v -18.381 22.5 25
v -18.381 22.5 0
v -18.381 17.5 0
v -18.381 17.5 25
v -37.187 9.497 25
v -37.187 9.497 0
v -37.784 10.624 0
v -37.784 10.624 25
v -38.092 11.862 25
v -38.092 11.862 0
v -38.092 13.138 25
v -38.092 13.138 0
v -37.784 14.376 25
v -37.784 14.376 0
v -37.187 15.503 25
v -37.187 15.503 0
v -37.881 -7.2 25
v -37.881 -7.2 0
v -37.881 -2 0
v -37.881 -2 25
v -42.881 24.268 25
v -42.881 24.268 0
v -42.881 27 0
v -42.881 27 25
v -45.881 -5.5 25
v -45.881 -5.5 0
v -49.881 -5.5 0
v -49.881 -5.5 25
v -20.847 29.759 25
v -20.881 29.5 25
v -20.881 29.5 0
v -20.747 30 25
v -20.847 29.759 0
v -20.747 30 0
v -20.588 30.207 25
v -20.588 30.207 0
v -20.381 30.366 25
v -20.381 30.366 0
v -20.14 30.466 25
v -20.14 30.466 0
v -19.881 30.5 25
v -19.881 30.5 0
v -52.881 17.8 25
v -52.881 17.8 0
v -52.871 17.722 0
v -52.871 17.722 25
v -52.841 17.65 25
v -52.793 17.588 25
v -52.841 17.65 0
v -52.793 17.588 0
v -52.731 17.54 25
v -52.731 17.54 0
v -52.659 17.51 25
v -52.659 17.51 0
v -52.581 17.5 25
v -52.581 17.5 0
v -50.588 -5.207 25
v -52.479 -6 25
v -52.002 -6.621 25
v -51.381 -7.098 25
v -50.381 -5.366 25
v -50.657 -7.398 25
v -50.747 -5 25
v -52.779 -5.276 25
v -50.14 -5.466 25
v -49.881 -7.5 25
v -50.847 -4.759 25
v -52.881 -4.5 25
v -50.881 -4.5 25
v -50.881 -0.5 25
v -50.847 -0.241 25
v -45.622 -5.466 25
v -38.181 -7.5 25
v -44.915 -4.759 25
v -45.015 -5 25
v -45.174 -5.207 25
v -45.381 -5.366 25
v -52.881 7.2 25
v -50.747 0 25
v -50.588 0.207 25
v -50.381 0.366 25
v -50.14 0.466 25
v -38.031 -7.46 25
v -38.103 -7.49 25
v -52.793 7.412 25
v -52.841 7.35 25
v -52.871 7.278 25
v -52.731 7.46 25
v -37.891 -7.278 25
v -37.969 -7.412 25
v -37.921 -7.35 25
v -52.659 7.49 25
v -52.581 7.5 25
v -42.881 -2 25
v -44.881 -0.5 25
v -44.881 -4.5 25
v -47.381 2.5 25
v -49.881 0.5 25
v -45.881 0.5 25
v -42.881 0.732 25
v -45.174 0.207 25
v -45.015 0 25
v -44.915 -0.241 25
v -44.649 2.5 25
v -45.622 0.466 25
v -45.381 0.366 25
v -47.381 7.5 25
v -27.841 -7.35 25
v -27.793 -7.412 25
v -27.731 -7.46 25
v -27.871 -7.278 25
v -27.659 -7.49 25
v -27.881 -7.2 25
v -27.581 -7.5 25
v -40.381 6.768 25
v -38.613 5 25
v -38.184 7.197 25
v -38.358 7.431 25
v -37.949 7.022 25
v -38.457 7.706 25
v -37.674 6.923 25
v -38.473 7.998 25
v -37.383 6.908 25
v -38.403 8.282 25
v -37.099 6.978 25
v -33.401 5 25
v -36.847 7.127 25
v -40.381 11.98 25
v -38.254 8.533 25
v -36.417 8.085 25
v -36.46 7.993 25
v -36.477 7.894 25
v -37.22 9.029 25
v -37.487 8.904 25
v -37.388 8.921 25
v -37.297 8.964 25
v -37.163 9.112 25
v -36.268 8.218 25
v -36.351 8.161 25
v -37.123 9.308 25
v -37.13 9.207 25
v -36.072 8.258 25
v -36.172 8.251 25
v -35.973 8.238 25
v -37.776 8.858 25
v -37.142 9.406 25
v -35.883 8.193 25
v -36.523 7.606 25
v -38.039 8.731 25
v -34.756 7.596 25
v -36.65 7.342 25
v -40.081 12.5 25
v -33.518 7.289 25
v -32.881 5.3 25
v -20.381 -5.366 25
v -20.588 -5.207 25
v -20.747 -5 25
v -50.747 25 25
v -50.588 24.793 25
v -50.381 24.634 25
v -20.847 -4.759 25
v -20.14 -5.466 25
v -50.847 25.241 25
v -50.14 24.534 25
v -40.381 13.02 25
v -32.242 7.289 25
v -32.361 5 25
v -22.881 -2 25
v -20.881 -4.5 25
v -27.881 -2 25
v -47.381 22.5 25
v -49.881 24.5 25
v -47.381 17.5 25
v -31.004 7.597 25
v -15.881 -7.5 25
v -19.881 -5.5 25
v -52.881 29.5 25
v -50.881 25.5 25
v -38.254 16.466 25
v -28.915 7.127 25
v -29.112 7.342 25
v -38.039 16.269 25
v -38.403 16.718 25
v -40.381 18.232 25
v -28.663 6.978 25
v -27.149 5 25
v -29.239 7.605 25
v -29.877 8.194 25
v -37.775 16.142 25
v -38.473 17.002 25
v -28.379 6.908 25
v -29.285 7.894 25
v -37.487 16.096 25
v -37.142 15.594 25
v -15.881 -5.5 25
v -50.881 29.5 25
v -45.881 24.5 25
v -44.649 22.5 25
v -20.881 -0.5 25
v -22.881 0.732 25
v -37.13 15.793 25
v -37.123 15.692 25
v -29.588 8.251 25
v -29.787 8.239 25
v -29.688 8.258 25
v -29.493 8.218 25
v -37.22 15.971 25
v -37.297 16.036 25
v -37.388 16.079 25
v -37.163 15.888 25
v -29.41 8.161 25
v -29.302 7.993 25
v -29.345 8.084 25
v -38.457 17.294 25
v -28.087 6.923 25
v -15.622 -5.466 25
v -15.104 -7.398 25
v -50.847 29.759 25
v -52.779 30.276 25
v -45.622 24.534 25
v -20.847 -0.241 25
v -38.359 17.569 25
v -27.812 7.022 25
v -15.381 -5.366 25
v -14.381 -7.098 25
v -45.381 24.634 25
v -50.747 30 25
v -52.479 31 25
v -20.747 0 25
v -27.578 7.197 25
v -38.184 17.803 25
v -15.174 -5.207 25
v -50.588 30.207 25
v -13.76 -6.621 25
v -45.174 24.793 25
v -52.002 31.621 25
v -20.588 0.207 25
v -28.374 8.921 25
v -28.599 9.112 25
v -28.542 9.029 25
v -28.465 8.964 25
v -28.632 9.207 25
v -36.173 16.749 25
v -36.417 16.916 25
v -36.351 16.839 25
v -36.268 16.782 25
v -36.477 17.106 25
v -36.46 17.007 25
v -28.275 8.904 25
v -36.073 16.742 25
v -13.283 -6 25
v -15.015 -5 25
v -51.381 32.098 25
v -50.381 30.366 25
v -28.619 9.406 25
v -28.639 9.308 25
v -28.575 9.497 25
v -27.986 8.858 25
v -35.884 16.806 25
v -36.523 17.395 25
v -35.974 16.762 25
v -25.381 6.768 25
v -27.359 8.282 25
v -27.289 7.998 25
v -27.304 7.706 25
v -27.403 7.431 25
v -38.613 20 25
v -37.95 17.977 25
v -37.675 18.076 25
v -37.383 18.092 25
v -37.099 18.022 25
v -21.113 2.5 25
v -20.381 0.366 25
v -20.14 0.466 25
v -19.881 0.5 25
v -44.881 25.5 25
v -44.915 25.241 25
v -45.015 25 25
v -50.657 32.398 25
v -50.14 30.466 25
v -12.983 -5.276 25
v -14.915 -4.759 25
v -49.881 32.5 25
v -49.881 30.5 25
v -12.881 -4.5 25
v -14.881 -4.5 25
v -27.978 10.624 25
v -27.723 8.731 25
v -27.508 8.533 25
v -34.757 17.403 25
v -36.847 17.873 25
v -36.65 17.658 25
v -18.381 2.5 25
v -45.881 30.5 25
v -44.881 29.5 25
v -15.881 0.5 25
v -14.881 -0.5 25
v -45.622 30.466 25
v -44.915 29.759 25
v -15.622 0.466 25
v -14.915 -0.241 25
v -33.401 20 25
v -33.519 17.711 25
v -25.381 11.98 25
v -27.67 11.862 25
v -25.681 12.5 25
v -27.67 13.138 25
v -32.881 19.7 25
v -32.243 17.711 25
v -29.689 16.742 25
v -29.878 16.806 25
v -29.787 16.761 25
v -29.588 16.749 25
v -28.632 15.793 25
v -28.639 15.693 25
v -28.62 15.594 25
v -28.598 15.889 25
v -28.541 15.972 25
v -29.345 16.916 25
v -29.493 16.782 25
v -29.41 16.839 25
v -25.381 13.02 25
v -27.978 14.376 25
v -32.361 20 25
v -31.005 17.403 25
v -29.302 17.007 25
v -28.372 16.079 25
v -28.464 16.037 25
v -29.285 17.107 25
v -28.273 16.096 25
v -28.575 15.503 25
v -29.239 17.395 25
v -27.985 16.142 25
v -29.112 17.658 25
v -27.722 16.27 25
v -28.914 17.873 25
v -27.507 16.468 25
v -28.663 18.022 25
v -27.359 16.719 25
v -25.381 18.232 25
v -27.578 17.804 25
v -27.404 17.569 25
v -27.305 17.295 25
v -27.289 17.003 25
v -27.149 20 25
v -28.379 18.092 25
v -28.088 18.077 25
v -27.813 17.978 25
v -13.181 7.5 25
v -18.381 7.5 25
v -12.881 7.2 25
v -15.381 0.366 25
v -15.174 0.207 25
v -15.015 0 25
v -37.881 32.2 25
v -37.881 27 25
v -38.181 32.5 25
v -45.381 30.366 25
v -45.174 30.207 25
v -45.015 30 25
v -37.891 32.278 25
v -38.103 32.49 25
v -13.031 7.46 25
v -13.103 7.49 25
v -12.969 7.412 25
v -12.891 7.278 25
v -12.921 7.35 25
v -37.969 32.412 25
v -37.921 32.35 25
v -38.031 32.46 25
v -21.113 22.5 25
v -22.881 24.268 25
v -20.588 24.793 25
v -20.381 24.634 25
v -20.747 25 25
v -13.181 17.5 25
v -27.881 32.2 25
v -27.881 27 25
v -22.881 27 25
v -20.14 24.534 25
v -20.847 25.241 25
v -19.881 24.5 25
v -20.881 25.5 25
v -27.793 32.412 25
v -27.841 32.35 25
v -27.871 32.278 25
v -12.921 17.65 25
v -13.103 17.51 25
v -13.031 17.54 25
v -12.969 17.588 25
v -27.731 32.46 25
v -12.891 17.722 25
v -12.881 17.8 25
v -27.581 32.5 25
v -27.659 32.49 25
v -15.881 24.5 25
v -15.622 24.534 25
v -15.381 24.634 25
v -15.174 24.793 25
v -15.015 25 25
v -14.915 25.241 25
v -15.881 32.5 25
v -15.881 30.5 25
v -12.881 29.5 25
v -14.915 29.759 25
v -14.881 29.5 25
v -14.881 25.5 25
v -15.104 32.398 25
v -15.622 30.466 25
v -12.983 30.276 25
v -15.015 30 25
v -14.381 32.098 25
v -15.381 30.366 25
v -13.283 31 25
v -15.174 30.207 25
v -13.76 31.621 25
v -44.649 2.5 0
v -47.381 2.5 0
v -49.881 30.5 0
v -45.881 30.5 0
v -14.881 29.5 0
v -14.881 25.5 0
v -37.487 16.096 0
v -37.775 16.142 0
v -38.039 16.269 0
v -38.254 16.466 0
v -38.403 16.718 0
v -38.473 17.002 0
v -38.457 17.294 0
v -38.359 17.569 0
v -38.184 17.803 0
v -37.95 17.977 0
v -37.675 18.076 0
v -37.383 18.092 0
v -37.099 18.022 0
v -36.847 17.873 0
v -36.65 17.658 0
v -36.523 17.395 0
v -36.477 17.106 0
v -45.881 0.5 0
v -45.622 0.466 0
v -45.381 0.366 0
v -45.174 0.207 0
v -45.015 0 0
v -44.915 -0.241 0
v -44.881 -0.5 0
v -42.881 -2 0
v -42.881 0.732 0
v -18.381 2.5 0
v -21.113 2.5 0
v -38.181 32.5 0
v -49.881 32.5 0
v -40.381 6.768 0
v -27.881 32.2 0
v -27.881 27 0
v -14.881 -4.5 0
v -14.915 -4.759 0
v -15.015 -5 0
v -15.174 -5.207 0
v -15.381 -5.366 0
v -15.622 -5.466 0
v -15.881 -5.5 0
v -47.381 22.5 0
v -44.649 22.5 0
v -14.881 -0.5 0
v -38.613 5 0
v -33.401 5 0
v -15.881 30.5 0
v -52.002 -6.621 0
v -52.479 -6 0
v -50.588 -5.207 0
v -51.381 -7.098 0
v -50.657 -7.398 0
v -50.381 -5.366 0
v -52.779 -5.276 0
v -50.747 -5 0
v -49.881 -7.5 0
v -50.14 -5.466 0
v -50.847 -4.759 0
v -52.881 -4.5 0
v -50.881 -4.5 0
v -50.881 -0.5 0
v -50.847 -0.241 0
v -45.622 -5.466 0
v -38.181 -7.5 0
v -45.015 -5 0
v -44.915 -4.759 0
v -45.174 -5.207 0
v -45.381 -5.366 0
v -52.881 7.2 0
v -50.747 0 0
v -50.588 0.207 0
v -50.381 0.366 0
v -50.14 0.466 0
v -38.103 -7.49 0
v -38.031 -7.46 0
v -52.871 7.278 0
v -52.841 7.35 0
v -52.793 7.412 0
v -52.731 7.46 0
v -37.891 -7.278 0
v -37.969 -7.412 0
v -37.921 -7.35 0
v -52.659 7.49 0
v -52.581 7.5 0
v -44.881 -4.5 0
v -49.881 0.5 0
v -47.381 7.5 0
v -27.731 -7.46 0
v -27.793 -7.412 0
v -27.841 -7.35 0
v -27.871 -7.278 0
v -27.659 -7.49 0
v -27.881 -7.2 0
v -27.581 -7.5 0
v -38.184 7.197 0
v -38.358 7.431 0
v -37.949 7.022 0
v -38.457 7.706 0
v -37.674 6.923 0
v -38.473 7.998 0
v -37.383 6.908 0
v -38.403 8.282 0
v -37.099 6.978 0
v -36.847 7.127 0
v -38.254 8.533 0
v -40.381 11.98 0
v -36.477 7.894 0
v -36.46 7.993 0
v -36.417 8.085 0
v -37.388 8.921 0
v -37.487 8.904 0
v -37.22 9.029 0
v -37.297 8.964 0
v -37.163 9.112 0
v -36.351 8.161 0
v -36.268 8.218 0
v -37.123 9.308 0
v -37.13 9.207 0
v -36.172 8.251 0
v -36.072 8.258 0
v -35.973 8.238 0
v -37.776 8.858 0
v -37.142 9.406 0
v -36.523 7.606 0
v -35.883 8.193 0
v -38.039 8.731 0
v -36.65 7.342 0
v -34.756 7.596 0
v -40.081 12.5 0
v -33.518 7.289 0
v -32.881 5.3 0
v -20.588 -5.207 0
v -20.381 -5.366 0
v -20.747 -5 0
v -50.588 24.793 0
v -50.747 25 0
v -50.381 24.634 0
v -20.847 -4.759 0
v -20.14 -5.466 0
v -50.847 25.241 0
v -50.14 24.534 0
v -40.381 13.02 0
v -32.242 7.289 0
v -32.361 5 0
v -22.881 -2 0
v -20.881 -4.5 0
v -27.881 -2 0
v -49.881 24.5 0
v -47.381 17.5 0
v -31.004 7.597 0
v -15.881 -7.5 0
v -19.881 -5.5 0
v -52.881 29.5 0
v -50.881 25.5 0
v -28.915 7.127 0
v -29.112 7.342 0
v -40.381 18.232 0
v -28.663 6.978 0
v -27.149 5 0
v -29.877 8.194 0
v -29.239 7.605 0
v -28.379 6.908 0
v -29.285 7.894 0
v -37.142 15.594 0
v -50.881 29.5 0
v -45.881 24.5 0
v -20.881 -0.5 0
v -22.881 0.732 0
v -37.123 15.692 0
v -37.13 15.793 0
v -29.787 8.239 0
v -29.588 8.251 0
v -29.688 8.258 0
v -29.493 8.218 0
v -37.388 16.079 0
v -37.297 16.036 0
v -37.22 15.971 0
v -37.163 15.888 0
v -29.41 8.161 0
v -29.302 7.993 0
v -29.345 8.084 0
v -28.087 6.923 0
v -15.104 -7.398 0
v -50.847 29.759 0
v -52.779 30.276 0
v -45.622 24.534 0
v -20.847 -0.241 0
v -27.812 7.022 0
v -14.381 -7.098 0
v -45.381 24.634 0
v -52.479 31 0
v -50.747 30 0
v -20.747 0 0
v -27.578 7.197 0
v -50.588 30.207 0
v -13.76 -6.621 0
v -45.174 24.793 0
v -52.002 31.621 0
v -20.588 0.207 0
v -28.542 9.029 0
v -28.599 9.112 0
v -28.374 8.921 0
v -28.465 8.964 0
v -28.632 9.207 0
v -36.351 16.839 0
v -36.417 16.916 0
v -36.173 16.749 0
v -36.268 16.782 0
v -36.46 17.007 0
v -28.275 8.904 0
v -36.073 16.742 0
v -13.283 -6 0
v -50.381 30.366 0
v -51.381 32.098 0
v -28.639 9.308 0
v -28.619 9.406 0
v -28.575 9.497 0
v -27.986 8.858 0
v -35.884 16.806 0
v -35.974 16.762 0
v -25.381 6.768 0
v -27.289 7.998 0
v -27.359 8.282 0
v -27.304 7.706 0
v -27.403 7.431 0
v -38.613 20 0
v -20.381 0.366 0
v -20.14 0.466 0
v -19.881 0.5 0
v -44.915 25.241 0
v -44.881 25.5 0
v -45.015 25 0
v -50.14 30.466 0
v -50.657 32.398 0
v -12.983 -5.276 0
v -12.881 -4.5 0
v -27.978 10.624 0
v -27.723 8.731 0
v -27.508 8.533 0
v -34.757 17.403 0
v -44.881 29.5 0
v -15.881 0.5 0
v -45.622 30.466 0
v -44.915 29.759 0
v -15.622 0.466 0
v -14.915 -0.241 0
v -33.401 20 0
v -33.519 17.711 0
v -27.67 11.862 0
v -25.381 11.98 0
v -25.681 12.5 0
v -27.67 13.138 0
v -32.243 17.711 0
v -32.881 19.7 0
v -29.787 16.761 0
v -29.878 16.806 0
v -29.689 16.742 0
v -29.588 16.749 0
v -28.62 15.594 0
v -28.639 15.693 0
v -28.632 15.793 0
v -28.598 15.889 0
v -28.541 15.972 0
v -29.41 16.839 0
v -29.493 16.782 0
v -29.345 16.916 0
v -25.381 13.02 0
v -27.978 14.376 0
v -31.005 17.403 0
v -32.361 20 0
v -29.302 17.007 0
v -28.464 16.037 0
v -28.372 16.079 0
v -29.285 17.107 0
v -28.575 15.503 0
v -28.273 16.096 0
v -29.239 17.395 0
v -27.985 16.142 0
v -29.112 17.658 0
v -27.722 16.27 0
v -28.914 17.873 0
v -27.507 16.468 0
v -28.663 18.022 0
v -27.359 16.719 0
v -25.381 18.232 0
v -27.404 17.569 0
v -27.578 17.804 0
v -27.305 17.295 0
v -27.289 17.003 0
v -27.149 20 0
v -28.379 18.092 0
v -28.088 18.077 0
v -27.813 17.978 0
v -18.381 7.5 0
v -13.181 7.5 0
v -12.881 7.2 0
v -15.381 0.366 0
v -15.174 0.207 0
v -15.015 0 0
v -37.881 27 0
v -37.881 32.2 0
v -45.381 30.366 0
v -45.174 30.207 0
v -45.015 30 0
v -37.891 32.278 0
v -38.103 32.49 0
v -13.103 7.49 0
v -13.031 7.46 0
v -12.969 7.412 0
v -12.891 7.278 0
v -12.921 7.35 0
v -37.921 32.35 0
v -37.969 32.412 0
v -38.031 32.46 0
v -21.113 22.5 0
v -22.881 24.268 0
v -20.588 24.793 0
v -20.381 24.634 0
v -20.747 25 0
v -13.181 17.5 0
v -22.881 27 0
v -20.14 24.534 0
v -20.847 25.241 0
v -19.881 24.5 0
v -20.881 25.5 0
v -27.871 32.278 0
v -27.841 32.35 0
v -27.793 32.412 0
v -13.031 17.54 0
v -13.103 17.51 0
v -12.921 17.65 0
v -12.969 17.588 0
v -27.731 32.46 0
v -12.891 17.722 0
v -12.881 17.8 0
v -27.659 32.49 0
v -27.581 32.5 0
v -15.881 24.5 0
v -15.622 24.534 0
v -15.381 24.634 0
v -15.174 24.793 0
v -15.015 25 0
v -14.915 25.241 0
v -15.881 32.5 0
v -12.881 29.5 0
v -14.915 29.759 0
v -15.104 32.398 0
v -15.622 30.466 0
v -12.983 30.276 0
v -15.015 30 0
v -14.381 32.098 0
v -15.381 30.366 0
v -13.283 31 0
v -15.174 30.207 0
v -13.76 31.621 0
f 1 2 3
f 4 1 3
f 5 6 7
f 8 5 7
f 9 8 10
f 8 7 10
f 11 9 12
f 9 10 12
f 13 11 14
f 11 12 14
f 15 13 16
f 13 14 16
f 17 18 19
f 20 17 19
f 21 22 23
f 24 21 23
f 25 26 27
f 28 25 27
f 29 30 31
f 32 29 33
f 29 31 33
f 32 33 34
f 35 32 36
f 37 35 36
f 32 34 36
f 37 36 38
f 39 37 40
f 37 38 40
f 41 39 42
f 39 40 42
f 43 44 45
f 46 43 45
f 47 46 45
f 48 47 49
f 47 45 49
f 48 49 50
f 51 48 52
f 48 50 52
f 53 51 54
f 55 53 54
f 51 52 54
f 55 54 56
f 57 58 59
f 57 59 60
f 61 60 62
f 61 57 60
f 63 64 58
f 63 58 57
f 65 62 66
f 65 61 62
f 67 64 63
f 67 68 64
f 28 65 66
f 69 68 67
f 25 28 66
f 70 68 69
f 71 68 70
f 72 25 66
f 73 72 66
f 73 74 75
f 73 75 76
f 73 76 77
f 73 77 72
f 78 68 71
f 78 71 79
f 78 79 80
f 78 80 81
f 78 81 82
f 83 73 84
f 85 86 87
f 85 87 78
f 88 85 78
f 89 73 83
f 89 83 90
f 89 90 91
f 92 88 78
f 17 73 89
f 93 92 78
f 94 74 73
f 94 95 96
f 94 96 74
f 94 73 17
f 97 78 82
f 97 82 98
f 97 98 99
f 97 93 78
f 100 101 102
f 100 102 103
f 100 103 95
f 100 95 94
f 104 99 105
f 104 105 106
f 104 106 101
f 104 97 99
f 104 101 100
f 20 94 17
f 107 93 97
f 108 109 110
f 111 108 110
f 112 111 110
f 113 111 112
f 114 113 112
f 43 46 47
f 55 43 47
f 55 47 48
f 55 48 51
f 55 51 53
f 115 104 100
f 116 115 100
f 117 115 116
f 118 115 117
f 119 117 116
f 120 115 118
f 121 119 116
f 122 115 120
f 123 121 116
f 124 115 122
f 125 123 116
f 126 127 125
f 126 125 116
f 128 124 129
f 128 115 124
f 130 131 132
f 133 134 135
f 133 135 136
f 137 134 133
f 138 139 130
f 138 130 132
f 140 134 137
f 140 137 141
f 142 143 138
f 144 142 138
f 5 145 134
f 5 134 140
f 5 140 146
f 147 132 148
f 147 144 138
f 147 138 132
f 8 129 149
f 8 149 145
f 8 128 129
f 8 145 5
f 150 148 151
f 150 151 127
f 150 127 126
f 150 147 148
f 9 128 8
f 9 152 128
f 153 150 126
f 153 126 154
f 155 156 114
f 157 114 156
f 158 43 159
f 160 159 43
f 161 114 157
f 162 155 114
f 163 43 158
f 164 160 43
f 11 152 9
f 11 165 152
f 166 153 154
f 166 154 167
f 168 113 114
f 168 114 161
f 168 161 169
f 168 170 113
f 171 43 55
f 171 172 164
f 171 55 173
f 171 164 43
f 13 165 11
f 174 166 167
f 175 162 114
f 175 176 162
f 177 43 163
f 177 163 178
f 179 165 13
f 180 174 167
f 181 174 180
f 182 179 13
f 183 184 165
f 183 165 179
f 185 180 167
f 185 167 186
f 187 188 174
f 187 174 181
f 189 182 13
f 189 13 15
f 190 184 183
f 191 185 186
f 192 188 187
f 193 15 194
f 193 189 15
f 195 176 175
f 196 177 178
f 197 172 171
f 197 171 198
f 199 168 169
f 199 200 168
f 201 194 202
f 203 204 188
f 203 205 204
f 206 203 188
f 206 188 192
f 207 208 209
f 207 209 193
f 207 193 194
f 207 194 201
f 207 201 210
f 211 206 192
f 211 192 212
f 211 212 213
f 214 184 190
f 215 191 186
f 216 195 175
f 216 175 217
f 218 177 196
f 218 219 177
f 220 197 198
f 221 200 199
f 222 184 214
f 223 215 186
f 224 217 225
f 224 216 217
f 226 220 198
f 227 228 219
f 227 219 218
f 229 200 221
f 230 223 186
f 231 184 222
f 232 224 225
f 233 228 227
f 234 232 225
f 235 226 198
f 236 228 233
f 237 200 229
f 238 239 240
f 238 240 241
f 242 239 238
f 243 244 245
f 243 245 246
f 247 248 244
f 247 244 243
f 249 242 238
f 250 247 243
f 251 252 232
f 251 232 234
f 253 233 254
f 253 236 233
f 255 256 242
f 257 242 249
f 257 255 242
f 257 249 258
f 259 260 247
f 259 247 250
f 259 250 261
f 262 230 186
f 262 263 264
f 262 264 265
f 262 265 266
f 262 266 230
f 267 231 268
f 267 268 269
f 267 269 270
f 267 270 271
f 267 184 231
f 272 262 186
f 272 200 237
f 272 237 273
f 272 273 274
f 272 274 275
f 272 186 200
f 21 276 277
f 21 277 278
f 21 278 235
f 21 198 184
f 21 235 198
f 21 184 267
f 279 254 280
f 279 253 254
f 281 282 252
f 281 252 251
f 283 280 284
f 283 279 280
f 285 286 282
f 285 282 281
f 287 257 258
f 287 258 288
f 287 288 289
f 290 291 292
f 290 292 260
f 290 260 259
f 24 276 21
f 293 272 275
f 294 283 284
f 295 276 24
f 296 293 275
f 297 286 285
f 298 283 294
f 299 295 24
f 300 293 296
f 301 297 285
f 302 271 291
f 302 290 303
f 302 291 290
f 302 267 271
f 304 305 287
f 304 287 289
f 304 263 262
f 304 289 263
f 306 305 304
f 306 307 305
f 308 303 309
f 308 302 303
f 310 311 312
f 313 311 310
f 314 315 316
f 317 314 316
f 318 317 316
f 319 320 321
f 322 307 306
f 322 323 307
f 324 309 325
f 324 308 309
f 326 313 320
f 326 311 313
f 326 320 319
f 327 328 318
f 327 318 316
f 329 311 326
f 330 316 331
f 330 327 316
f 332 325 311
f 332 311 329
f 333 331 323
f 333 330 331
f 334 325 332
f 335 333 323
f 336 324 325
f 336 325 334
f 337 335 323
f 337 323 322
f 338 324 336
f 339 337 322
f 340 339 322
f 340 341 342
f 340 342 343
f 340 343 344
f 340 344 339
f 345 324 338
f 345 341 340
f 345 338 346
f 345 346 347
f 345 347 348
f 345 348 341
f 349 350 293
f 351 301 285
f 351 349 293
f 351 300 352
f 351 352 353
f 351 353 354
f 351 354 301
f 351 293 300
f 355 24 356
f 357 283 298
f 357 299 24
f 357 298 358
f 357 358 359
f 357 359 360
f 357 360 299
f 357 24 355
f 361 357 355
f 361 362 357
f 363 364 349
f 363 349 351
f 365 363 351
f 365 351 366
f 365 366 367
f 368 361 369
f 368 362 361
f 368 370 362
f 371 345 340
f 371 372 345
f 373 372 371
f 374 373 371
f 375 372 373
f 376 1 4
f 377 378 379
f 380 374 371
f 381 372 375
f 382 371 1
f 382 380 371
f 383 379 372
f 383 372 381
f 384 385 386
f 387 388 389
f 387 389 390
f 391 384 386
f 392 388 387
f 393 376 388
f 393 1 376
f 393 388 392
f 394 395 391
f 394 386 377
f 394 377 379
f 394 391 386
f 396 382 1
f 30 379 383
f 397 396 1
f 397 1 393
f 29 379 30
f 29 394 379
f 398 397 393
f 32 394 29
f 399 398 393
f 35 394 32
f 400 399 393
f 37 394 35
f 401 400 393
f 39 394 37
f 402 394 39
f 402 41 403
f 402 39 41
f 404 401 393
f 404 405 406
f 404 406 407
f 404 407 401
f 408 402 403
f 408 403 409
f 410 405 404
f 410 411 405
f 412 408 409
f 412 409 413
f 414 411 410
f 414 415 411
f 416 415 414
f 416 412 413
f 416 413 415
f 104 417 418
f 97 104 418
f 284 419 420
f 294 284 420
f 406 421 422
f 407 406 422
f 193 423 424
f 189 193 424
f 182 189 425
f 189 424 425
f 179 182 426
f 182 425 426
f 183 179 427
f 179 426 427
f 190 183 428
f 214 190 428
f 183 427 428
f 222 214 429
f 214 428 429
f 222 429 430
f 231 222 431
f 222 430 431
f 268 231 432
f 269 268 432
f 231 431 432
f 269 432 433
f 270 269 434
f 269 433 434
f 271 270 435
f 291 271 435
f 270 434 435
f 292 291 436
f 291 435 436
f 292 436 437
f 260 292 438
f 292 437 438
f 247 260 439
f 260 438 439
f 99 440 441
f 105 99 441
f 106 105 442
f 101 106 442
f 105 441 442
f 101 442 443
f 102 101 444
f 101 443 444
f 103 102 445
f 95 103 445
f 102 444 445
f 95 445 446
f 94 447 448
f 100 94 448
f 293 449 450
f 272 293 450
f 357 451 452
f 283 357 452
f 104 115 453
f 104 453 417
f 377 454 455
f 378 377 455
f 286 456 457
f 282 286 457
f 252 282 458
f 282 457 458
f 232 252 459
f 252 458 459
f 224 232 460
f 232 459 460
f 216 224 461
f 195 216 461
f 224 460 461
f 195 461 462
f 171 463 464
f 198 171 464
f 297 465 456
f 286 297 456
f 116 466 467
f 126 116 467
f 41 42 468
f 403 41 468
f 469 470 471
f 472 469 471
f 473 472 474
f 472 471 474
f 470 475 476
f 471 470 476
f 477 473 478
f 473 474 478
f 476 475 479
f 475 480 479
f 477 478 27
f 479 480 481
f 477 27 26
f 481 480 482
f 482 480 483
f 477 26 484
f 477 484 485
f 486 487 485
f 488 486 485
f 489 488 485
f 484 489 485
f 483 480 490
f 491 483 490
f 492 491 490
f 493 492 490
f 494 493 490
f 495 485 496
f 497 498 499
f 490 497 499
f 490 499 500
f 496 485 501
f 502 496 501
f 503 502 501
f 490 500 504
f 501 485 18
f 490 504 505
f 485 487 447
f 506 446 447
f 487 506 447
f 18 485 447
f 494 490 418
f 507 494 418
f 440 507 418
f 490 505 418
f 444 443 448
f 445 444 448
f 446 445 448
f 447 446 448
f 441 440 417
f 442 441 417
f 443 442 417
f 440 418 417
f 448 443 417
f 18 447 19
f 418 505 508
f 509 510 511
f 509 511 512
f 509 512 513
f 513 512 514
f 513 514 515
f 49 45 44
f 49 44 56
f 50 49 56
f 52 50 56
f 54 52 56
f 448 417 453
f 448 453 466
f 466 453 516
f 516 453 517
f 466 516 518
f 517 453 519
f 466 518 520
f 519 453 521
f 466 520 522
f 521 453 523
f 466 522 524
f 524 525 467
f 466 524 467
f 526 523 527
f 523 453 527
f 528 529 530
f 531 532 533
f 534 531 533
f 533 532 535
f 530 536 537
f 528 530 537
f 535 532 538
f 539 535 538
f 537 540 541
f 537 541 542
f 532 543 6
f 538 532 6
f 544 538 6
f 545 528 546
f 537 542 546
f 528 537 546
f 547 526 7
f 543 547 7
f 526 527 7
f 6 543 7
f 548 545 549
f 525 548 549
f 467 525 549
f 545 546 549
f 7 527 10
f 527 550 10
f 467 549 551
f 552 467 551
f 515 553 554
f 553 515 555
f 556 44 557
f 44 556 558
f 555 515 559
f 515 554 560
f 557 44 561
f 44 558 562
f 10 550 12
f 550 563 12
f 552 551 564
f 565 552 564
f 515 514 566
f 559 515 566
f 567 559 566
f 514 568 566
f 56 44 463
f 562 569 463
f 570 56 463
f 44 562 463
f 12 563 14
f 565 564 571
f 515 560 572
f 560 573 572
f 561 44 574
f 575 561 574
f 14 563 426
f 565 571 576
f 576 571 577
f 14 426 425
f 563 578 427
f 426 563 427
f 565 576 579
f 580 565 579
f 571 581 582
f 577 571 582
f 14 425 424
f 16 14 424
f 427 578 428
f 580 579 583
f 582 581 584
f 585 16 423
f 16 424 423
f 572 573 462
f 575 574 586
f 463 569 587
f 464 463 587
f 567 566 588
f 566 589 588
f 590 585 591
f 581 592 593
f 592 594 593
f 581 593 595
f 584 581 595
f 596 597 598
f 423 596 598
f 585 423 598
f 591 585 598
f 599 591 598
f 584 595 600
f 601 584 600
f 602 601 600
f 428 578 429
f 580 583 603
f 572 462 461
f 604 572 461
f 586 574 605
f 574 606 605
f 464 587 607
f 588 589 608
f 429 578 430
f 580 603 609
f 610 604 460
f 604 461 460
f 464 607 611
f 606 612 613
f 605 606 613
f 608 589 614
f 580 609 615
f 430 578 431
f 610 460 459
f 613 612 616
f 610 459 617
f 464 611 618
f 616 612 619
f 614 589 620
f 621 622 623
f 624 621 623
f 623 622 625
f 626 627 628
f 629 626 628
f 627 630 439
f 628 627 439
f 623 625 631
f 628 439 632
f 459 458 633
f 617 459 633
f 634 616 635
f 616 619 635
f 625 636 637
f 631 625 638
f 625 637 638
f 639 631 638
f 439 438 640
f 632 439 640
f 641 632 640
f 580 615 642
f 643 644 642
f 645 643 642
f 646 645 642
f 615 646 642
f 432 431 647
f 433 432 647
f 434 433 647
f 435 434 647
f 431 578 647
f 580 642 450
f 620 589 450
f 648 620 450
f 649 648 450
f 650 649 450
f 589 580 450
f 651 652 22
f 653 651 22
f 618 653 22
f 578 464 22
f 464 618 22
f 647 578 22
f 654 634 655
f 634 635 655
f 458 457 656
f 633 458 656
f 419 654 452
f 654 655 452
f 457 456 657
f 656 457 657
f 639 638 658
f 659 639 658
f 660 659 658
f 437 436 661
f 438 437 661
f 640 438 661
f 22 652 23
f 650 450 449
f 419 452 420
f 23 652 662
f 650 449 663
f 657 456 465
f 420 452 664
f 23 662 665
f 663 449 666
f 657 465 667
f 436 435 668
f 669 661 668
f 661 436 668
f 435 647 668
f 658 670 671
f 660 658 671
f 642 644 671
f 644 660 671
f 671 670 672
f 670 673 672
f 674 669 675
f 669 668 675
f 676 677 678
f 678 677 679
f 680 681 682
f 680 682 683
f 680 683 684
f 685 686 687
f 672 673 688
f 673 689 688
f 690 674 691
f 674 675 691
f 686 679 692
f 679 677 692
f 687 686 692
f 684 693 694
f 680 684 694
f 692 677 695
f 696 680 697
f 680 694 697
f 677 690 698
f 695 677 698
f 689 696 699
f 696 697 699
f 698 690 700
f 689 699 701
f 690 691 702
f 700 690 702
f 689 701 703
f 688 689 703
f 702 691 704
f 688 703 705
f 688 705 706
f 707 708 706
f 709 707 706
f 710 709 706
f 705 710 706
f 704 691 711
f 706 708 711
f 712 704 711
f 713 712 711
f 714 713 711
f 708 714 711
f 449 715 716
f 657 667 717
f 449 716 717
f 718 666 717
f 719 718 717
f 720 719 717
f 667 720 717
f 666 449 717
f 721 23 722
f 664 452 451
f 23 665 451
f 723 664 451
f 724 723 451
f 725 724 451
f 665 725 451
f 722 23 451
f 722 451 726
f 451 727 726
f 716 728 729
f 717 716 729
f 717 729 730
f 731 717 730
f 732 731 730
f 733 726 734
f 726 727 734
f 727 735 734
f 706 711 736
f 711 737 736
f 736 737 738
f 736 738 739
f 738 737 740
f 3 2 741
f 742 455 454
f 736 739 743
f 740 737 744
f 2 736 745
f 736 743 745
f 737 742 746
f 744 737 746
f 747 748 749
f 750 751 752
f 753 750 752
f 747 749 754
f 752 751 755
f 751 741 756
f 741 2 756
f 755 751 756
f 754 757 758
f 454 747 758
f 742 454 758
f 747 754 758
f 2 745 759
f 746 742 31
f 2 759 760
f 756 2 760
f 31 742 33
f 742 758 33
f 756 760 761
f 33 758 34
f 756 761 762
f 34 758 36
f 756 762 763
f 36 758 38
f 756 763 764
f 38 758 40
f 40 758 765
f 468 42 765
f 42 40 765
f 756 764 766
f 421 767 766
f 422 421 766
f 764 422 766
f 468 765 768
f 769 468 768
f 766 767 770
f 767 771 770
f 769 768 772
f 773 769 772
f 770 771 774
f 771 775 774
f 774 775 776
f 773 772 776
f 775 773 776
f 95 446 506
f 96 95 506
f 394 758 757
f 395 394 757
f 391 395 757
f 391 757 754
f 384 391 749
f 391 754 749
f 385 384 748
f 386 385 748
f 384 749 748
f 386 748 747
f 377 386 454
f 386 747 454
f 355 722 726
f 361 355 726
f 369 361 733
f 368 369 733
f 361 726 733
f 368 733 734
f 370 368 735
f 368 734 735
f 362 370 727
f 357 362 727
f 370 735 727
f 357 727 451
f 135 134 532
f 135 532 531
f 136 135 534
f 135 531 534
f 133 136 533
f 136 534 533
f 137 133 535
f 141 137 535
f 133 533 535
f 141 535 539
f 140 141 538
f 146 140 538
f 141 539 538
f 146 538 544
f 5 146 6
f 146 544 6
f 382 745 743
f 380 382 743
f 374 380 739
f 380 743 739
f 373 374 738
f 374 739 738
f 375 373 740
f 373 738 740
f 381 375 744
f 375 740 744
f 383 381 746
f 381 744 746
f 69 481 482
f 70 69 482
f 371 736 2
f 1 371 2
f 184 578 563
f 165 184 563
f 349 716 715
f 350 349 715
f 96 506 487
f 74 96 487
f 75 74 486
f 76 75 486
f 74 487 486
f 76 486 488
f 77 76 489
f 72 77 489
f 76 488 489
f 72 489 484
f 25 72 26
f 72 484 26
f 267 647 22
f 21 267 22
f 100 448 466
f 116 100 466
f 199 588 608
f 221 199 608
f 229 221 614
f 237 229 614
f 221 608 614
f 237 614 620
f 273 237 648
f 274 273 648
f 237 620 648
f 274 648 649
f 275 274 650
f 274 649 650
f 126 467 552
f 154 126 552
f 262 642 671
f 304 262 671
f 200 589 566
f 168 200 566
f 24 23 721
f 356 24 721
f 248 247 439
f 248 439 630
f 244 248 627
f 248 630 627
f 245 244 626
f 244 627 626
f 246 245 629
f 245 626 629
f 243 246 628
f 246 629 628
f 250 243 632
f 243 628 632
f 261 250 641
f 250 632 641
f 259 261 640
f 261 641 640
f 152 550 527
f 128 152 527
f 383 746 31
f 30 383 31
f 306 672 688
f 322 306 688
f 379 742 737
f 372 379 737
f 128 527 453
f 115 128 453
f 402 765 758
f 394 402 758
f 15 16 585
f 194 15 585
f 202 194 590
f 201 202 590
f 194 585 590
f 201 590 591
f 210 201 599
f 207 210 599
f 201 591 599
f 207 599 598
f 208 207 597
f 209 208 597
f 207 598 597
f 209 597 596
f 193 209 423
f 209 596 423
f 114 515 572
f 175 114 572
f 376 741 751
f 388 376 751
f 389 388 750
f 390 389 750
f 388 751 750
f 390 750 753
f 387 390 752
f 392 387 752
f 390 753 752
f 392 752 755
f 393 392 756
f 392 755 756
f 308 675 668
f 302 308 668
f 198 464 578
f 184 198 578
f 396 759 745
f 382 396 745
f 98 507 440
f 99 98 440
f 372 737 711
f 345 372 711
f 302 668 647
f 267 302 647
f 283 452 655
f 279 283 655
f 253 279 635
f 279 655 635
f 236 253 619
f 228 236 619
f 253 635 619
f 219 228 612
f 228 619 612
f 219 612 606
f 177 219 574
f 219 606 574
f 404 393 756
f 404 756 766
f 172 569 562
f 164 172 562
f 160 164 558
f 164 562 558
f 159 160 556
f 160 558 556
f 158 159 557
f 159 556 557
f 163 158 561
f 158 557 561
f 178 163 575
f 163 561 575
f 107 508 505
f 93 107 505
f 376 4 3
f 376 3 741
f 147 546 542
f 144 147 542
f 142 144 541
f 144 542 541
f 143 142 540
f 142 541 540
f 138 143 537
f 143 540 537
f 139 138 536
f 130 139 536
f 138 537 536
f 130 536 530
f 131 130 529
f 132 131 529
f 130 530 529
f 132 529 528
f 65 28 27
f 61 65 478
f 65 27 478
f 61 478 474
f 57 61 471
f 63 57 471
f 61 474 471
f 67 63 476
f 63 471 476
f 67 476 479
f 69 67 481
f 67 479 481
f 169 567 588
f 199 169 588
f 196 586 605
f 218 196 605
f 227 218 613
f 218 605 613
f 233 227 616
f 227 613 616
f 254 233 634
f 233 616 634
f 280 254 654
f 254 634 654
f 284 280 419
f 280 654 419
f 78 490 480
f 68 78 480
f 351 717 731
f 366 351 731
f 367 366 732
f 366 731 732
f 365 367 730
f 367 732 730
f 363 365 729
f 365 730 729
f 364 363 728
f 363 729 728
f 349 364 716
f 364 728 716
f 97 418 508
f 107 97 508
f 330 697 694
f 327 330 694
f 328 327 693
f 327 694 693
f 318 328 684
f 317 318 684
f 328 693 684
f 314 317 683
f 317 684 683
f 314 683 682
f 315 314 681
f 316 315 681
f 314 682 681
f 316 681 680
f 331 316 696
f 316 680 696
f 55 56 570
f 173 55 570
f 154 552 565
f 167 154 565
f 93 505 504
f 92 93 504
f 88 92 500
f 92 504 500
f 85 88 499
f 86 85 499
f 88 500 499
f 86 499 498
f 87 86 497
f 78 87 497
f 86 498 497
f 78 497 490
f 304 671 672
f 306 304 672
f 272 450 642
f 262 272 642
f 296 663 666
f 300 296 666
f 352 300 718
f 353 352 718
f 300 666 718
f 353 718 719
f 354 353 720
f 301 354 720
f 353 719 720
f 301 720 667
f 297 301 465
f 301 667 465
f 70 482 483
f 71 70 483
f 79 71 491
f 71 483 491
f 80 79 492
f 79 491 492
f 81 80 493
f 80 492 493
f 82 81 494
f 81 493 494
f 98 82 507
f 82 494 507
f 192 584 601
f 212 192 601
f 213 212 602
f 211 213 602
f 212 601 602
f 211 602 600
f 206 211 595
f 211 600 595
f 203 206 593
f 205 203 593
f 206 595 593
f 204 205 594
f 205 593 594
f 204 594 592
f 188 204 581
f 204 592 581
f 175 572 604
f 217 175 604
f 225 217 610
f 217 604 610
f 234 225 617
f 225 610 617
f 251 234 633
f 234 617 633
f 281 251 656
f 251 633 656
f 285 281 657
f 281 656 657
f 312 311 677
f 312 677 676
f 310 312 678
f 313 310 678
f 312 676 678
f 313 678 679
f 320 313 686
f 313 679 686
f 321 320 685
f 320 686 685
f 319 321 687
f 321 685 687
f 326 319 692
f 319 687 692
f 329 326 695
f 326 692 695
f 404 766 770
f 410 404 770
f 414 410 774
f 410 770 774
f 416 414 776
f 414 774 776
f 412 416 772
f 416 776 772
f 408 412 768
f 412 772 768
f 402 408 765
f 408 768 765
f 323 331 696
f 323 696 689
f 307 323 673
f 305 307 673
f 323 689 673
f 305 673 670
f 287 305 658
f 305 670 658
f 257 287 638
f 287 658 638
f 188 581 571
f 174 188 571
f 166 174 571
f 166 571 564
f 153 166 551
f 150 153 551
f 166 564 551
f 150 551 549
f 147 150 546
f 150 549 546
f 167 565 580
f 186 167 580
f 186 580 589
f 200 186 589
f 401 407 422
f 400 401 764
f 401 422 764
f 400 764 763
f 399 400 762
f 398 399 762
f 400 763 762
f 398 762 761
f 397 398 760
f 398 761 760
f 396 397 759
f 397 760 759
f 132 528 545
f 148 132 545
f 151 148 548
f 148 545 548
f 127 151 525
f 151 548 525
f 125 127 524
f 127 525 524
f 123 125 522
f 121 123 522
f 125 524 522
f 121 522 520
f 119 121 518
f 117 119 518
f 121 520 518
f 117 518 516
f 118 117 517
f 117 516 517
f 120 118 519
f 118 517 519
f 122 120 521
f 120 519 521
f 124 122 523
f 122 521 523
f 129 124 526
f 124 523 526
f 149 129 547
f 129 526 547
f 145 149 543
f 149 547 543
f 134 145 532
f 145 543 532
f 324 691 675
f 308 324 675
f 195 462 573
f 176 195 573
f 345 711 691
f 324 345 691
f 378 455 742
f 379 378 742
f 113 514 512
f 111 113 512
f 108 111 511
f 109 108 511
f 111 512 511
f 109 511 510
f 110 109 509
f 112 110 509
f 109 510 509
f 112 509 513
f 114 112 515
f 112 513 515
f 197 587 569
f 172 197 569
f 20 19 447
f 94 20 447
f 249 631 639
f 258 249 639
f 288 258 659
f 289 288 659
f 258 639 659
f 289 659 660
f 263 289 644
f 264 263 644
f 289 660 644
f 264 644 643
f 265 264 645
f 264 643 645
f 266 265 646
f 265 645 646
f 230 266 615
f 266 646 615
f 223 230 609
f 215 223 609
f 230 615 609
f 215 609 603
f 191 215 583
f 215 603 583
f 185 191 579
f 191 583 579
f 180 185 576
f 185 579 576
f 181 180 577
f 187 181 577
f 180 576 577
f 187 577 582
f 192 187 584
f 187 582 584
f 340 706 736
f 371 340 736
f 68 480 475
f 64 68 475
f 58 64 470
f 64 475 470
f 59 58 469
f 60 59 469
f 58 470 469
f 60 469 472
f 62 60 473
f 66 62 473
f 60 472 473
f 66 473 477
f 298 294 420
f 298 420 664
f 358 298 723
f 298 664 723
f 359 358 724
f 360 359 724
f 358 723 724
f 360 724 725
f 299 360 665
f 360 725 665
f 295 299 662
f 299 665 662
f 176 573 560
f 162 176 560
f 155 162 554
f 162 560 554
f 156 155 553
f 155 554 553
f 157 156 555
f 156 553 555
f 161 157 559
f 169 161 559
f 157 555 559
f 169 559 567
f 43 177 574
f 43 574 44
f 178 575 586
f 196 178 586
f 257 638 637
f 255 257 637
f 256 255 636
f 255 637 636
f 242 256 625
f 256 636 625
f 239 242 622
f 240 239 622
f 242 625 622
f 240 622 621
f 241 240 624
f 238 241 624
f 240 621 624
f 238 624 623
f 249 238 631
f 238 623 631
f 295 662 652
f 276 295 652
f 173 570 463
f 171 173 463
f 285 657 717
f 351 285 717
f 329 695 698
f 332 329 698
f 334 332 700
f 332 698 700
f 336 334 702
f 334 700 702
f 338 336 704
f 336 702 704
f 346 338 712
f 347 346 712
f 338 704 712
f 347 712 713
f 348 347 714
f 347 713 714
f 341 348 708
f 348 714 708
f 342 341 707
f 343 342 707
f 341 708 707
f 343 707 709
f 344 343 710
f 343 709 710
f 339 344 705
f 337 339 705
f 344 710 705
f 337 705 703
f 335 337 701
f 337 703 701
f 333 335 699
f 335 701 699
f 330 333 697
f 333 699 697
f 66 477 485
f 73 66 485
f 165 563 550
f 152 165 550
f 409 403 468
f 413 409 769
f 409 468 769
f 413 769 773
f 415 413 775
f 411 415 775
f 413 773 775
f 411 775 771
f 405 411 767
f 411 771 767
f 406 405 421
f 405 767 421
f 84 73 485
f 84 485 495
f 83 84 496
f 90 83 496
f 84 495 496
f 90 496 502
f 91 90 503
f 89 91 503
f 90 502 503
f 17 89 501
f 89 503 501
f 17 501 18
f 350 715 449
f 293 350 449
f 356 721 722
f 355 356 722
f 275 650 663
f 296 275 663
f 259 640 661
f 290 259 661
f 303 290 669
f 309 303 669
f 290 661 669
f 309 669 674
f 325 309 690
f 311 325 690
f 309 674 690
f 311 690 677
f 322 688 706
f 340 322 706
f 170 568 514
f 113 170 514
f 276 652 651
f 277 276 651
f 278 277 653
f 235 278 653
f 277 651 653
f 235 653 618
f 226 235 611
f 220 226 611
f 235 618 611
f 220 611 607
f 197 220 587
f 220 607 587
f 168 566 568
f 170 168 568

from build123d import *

# Parameters (mm, degrees)
F1_DEPTH = 25


# Not quite as in the source:
# - ends of sketch curves that miss each other by under 0.0002 mm in the source are joined


with BuildPart() as f1:
    # F0 (on Top) → F1 (new body)
    with BuildSketch(Plane.XY):
        with BuildLine():
            Line((-18.380952, 17.5), (-13.180955, 17.5))
            ThreePointArc((-13.180955, 17.5), (-12.9688229656, 17.5878709656), (-12.880955, 17.800003))
            Line((-12.880955, 17.800003), (-12.880952, 29.500001))
            ThreePointArc((-12.880952, 29.500001), (-13.7596316564, 31.6213203436), (-15.880952, 32.5))
            Line((-15.880952, 32.5), (-27.580952, 32.5))
            ThreePointArc((-27.580952, 32.5), (-27.7930840344, 32.4121320344), (-27.880952, 32.2))
            Line((-27.880952, 32.2), (-27.880952, 27))
            Line((-27.880952, 27), (-22.880952, 27))
            Line((-22.880952, 27), (-22.880952, 24.267777))
            Line((-22.880952, 24.267777), (-27.148715, 20))
            Line((-27.148715, 20), (-32.361337, 20))
            Line((-32.361337, 20), (-32.880952, 19.7))
            Line((-32.880952, 19.7), (-33.400567, 20))
            Line((-33.400567, 20), (-38.613181, 20))
            Line((-38.613181, 20), (-42.880937, 24.267771))
            Line((-42.880937, 24.267771), (-42.880952, 27))
            Line((-42.880952, 27), (-37.880952, 27))
            Line((-37.880952, 27), (-37.880952, 32.2))
            ThreePointArc((-37.880952, 32.2), (-37.9688199656, 32.4121320344), (-38.180952, 32.5))
            Line((-38.180952, 32.5), (-49.880952, 32.5))
            ThreePointArc((-49.880952, 32.5), (-52.0022723436, 31.6213203436), (-52.880952, 29.5))
            Line((-52.880952, 29.5), (-52.880952, 17.800003))
            ThreePointArc((-52.880952, 17.800003), (-52.7930810344, 17.5878709656), (-52.580949, 17.500003))
            Line((-52.580949, 17.500003), (-47.380937, 17.5))
            Line((-47.380937, 17.5), (-47.380952, 22.5))
            Line((-47.380952, 22.5), (-44.648728, 22.500001))
            Line((-44.648728, 22.500001), (-40.380952, 18.232248))
            Line((-40.380952, 18.232248), (-40.380952, 13.019615))
            Line((-40.380952, 13.019615), (-40.080952, 12.5))
            Line((-40.080952, 12.5), (-40.380952, 11.980385))
            Line((-40.380952, 11.980385), (-40.380952, 6.767753))
            Line((-40.380952, 6.767753), (-44.648721, 2.499994))
            Line((-44.648721, 2.499994), (-47.380937, 2.500006))
            Line((-47.380937, 2.500006), (-47.380952, 7.5))
            Line((-47.380952, 7.5), (-52.580949, 7.5))
            ThreePointArc((-52.580949, 7.5), (-52.7930810344, 7.4121290344), (-52.880949, 7.199997))
            Line((-52.880949, 7.199997), (-52.880952, -4.5))
            ThreePointArc((-52.880952, -4.5), (-52.0022723436, -6.6213203436), (-49.880952, -7.5))
            Line((-49.880952, -7.5), (-38.180955, -7.5))
            ThreePointArc((-38.180955, -7.5), (-37.9688199656, -7.4121320344), (-37.880952, -7.2))
            Line((-37.880952, -7.2), (-37.880952, -2))
            Line((-37.880952, -2), (-42.880952, -2))
            Line((-42.880952, -2), (-42.880952, 0.732224))
            Line((-42.880952, 0.732224), (-38.613182, 5))
            Line((-38.613182, 5), (-33.400567, 5))
            Line((-33.400567, 5), (-32.880952, 5.3))
            Line((-32.880952, 5.3), (-32.361337, 5))
            Line((-32.361337, 5), (-27.148714, 5))
            Line((-27.148714, 5), (-22.880944, 0.732225))
            Line((-22.880944, 0.732225), (-22.880952, -2))
            Line((-22.880952, -2), (-27.880952, -2))
            Line((-27.880952, -2), (-27.880952, -7.2))
            ThreePointArc((-27.880952, -7.2), (-27.7930840344, -7.4121320344), (-27.580952, -7.5))
            Line((-27.580952, -7.5), (-15.880952, -7.5))
            ThreePointArc((-15.880952, -7.5), (-13.7596316564, -6.6213203436), (-12.880952, -4.5))
            Line((-12.880952, -4.5), (-12.880952, 7.199997))
            ThreePointArc((-12.880952, 7.199997), (-12.9688229656, 7.4121290344), (-13.180955, 7.499997))
            Line((-13.180955, 7.499997), (-18.380952, 7.5))
            Line((-18.380952, 7.5), (-18.380952, 2.5))
            Line((-18.380952, 2.5), (-21.113175, 2.499999))
            Line((-21.113175, 2.499999), (-25.380952, 6.76777))
            Line((-25.380952, 6.76777), (-25.380952, 11.980385))
            Line((-25.380952, 11.980385), (-25.680952, 12.5))
            Line((-25.680952, 12.5), (-25.380952, 13.019615))
            Line((-25.380952, 13.019615), (-25.380952, 18.232231))
            Line((-25.380952, 18.232231), (-21.113175, 22.5))
            Line((-21.113175, 22.5), (-18.380952, 22.5))
            Line((-18.380952, 22.5), (-18.380952, 17.5))
        make_face()
        with BuildLine():
            ThreePointArc((-50.880952, -0.5), (-50.5880587812, 0.2071067812), (-49.880952, 0.5))
            Line((-49.880952, 0.5), (-45.880937, 0.5))
            ThreePointArc((-45.880937, 0.5), (-45.1738452188, 0.2071007812), (-44.880952, -0.500006))
            Line((-44.880952, -0.500006), (-44.880952, -4.5))
            ThreePointArc((-44.880952, -4.5), (-45.1738452188, -5.2071067812), (-45.880952, -5.5))
            Line((-45.880952, -5.5), (-49.880952, -5.5))
            ThreePointArc((-49.880952, -5.5), (-50.5880587812, -5.2071067812), (-50.880952, -4.5))
            Line((-50.880952, -4.5), (-50.880952, -0.5))
        make_face(mode=Mode.SUBTRACT)
        with BuildLine():
            Line((-14.880952, -0.499999), (-14.880952, -4.5))
            ThreePointArc((-14.880952, -4.5), (-15.1738452188, -5.2071067812), (-15.880952, -5.5))
            Line((-15.880952, -5.5), (-19.880952, -5.5))
            ThreePointArc((-19.880952, -5.5), (-20.5880587812, -5.2071067812), (-20.880952, -4.5))
            Line((-20.880952, -4.5), (-20.880952, -0.499999))
            ThreePointArc((-20.880952, -0.499999), (-20.5880587812, 0.2071077812), (-19.880952, 0.500001))
            Line((-19.880952, 0.500001), (-15.880952, 0.500001))
            ThreePointArc((-15.880952, 0.500001), (-15.1738452188, 0.2071077812), (-14.880952, -0.499999))
        make_face(mode=Mode.SUBTRACT)
        with BuildLine():
            ThreePointArc((-37.1869759587, 9.4965590288), (-38.130952, 12.5000067994), (-37.186968179, 15.5034521248))
            ThreePointArc((-37.186968179, 15.5034521248), (-37.1632332946, 15.8875474988), (-37.4865620002, 16.0962359962))
            ThreePointArc((-37.4865620002, 16.0962359962), (-38.1843329758, 17.8032195777), (-36.4771934562, 17.1058309956))
            ThreePointArc((-36.4771934562, 17.1058309956), (-36.2684563797, 16.7822649872), (-35.8841472989, 16.8061954442))
            ThreePointArc((-35.8841472989, 16.8061954442), (-32.8808765483, 17.7499999995), (-29.8776329856, 16.8061090207))
            ThreePointArc((-29.8776329856, 16.8061090207), (-29.4930868042, 16.7824504958), (-29.2847080657, 17.1065090027))
            ThreePointArc((-29.2847080657, 17.1065090027), (-27.578165673, 17.8038098657), (-28.2729980022, 16.0962611865))
            ThreePointArc((-28.2729980022, 16.0962611865), (-28.5981729586, 15.8885199872), (-28.5748681009, 15.5033549322))
            ThreePointArc((-28.5748681009, 15.5033549322), (-27.6309520001, 12.5000377259), (-28.5748248894, 9.4967069229))
            ThreePointArc((-28.5748248894, 9.4967069229), (-28.5986102211, 9.1123426938), (-28.2748899919, 8.9037591925))
            ThreePointArc((-28.2748899919, 8.9037591925), (-27.577743326, 7.1966121229), (-29.2847147364, 7.8941890025))
            ThreePointArc((-29.2847147364, 7.8941890025), (-29.493086142, 8.2175661088), (-29.8770772102, 8.1942793139))
            ThreePointArc((-29.8770772102, 8.1942793139), (-32.8797784079, 7.2500001312), (-35.8829017766, 8.1929363205))
            ThreePointArc((-35.8829017766, 8.1929363205), (-36.2677680781, 8.2180997059), (-36.4771928672, 7.8942229943))
            ThreePointArc((-36.4771928672, 7.8942229943), (-38.1841540665, 7.1966015182), (-37.4870140032, 8.9037593199))
            ThreePointArc((-37.4870140032, 8.9037593199), (-37.1633341924, 9.1122631312), (-37.1869759587, 9.4965590288))
        make_face(mode=Mode.SUBTRACT)
        with BuildLine():
            Line((-49.880952, 30.5), (-45.880952, 30.5))
            ThreePointArc((-45.880952, 30.5), (-45.1738452188, 30.2071067812), (-44.880952, 29.5))
            Line((-44.880952, 29.5), (-44.880952, 25.5))
            ThreePointArc((-44.880952, 25.5), (-45.1738452188, 24.7928932188), (-45.880952, 24.5))
            Line((-45.880952, 24.5), (-49.880952, 24.5))
            ThreePointArc((-49.880952, 24.5), (-50.5880587812, 24.7928932188), (-50.880952, 25.5))
            Line((-50.880952, 25.5), (-50.880952, 29.5))
            ThreePointArc((-50.880952, 29.5), (-50.5880587812, 30.2071067812), (-49.880952, 30.5))
        make_face(mode=Mode.SUBTRACT)
        with BuildLine():
            ThreePointArc((-15.880952, 30.5), (-15.1738452188, 30.2071067812), (-14.880952, 29.5))
            Line((-14.880952, 29.5), (-14.880952, 25.5))
            ThreePointArc((-14.880952, 25.5), (-15.1738452188, 24.7928932188), (-15.880952, 24.5))
            Line((-15.880952, 24.5), (-19.880967, 24.5))
            ThreePointArc((-19.880967, 24.5), (-20.5880587812, 24.7928892188), (-20.880952, 25.499996))
            Line((-20.880952, 25.499996), (-20.880952, 29.5))
            ThreePointArc((-20.880952, 29.5), (-20.5880587812, 30.2071067812), (-19.880952, 30.5))
            Line((-19.880952, 30.5), (-15.880952, 30.5))
        make_face(mode=Mode.SUBTRACT)
    extrude(amount=F1_DEPTH)


solid = f1.part
